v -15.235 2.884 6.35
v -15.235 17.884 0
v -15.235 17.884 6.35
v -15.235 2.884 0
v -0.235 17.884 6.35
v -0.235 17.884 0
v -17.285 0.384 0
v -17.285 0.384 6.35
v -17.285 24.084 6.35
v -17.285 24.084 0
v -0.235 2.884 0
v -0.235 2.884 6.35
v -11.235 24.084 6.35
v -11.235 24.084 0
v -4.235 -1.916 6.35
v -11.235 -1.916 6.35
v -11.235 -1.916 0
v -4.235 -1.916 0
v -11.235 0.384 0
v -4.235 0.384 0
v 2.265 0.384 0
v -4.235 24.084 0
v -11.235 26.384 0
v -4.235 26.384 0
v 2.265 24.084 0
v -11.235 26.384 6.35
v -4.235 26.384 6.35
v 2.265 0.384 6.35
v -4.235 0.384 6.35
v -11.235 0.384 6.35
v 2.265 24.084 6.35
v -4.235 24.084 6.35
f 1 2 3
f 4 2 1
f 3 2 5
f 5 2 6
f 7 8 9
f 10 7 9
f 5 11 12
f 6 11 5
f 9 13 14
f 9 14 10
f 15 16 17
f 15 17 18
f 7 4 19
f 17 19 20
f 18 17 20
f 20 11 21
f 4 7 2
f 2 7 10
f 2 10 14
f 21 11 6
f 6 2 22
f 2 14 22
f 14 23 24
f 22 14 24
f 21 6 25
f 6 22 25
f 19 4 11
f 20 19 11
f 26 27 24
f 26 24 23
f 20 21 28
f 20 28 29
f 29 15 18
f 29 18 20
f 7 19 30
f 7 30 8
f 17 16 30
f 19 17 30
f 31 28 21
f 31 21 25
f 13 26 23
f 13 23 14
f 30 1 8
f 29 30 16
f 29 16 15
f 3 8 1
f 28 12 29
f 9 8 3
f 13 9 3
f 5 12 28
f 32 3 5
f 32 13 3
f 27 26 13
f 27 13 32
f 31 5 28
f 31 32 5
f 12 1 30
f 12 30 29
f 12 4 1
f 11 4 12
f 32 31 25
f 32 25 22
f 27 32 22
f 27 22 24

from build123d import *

# Parameters (mm, degrees)
BOSS_EXTRUDE1_DEPTH = 6.35
SKETCH2_W           = 20
SKETCH2_H           = 2.5
BOSS_EXTRUDE2_DEPTH = 6.35
SKETCH4_W           = 7
SKETCH4_H           = 2.3
BOSS_EXTRUDE3_DEPTH = 6.35
SKETCH5_W           = 0.45
SKETCH5_H           = 23.7
CUT_EXTRUDE1_DEPTH  = 10


with BuildPart() as part:
    # Sketch1 → Boss-Extrude1 (new body)
    with BuildSketch(Plane.XY):
        Polygon((-15.235299292, 17.883619427), (-15.235299292, 2.883619427), (-0.235299292, 2.883619427), (-0.235299292, 17.883619427), (2.264700708, 17.883619427), (2.264700708, 0.383619427), (-17.735299292, 0.383619427), (-17.735299292, 17.883619427), align=None)
    extrude(amount=BOSS_EXTRUDE1_DEPTH)

    # Sketch2 → Boss-Extrude2 (add, through all)
    with BuildSketch(Plane.XY):
        with Locations((-7.735299292, 19.133619427)):
            Rectangle(SKETCH2_W, SKETCH2_H)
    extrude(amount=BOSS_EXTRUDE2_DEPTH)

    # Sketch4 → Boss-Extrude3 (add)
    with BuildSketch(Plane.XY.offset(6.35)):
        Polygon((-17.735299292, 20.383619427), (2.264700708, 20.383619427), (2.264700708, 24.083619427), (-4.235299292, 24.083619427), (-4.235299292, 26.383619427), (-11.235299292, 26.383619427), (-11.235299292, 24.083619427), (-17.735299292, 24.083619427), align=None)
        with Locations((-7.735299292, -0.766380573)):
            Rectangle(SKETCH4_W, SKETCH4_H)
    extrude(amount=-BOSS_EXTRUDE3_DEPTH)

    # Sketch5 → Cut-Extrude1 (cut)
    with BuildSketch(Plane.XY.offset(6.35)):
        with Locations((-17.510299292, 12.233619427)):
            Rectangle(SKETCH5_W, SKETCH5_H)
    extrude(amount=-CUT_EXTRUDE1_DEPTH, mode=Mode.SUBTRACT)


solid = part.part
